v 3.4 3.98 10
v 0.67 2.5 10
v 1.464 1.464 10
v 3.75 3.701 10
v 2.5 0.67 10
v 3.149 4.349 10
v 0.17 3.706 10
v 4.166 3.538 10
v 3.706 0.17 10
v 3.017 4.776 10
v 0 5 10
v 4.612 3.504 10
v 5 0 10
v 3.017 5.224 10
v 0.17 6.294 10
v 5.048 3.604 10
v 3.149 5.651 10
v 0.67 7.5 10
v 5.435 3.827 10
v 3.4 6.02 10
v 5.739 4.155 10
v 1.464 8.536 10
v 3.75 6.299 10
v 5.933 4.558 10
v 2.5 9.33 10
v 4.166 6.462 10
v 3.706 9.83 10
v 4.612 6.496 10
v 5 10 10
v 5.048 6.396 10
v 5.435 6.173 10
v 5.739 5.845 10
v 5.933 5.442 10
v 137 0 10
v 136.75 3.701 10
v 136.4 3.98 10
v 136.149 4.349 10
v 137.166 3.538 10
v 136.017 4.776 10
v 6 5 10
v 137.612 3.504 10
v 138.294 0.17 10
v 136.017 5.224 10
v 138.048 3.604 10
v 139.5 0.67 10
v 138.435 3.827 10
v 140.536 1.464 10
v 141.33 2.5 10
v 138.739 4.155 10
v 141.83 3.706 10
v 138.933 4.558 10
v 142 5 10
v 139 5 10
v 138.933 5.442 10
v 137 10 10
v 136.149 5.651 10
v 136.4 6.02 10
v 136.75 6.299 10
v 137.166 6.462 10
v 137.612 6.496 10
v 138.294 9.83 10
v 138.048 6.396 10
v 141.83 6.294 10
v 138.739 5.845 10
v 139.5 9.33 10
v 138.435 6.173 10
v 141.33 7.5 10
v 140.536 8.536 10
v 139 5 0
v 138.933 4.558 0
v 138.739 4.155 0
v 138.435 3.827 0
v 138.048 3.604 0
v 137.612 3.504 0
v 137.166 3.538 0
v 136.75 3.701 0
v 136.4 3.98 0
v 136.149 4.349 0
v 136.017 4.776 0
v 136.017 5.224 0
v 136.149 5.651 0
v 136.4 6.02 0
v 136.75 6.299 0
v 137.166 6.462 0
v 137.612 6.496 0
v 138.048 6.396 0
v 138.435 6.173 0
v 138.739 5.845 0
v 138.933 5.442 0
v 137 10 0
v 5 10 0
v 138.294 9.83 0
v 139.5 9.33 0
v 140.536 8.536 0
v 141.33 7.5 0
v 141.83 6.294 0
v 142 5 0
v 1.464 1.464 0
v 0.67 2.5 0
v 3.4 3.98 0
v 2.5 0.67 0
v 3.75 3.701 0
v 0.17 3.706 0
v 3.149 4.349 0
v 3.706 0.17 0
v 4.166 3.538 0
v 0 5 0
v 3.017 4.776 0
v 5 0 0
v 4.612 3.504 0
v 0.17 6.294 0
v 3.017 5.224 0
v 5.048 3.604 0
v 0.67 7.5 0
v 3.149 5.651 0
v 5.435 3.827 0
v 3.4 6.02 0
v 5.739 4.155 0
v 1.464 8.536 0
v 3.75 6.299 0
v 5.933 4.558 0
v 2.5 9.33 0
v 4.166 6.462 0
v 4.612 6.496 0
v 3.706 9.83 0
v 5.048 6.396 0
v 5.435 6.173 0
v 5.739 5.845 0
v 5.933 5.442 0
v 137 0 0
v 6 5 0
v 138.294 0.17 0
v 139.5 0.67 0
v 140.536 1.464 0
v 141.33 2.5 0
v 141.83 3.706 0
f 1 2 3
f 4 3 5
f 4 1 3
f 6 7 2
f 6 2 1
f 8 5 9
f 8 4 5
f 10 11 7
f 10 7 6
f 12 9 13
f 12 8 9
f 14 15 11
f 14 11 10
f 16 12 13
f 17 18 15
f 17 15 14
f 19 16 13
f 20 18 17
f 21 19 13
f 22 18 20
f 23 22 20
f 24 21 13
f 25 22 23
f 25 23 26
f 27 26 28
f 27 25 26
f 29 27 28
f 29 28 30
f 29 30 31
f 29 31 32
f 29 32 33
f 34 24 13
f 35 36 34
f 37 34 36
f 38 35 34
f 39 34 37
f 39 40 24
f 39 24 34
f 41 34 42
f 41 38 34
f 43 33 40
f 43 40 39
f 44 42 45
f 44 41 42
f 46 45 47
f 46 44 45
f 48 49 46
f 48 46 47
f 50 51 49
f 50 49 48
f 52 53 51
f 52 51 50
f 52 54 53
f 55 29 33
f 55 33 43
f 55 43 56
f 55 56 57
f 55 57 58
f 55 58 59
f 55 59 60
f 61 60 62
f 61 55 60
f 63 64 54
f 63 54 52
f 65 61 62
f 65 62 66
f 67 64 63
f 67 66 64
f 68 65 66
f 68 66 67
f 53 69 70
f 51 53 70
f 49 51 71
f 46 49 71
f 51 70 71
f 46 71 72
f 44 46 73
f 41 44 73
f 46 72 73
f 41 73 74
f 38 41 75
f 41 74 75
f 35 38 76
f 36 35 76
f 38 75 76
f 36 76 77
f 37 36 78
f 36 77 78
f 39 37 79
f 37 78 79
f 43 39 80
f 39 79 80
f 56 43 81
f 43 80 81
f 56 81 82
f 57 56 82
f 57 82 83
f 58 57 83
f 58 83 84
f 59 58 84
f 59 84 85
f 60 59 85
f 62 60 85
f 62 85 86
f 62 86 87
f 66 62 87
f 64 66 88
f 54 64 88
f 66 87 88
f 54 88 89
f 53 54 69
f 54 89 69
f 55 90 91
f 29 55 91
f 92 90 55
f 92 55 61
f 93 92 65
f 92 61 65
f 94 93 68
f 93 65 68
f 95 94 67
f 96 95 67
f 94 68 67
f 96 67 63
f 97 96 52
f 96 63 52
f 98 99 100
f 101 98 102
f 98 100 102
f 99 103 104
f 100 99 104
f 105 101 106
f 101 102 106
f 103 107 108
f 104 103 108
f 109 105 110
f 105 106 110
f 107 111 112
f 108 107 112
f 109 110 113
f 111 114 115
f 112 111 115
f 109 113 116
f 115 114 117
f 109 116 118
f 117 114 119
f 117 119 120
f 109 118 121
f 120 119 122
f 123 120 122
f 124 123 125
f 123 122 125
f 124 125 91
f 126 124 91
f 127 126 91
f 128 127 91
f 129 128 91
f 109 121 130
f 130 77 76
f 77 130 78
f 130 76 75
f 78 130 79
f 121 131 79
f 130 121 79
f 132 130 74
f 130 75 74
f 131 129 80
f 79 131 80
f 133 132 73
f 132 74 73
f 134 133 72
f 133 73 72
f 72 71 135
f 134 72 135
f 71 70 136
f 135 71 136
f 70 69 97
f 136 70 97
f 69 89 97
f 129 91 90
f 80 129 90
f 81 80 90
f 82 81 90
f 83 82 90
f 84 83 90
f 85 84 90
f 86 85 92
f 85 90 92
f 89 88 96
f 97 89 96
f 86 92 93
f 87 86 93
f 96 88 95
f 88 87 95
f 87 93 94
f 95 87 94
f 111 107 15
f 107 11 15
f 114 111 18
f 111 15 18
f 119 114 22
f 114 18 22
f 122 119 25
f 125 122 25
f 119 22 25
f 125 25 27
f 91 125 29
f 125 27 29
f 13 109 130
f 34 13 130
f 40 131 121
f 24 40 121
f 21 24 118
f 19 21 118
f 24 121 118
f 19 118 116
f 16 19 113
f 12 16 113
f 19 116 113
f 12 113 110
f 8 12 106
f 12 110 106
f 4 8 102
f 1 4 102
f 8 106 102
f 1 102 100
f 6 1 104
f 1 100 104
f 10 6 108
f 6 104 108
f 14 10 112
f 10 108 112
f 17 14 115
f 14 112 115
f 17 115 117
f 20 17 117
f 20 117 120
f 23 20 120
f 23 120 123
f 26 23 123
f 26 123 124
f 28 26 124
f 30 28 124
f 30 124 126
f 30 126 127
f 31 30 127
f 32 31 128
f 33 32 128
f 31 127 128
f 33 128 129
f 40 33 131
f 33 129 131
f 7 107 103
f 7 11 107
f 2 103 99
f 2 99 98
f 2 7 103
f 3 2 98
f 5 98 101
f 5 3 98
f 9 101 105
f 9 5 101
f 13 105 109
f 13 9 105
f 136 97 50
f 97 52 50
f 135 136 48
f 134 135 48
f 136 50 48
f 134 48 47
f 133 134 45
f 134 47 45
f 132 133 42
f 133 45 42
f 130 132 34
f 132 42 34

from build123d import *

# Parameters (mm, degrees)
BOSS_EXTRUDE1_DEPTH = 10
FILLET2_R           = 5
FILLET3_R           = 5
FILLET4_R           = 5
FILLET5_R           = 5


with BuildPart() as part:
    # Sketch1 → Boss-Extrude1 (new body)
    with BuildSketch(Plane.XY):
        with BuildLine():
            Line((0, 10), (0, 5))
            Line((0, 5), (3, 5))
            ThreePointArc((3, 5), (4.5, 6.5), (6, 5))
            Line((6, 5), (136, 5))
            ThreePointArc((136, 5), (137.5, 6.5), (139, 5))
            Line((139, 5), (142, 5))
            Line((142, 5), (142, 10))
            Line((142, 10), (0, 10))
        make_face()
        with BuildLine():
            Line((3, 5), (0, 5))
            Line((0, 5), (0, 0))
            Line((0, 0), (142, 0))
            Line((142, 0), (142, 5))
            Line((142, 5), (139, 5))
            ThreePointArc((139, 5), (137.5, 3.5), (136, 5))
            Line((136, 5), (6, 5))
            ThreePointArc((6, 5), (4.5, 3.5), (3, 5))
        make_face()
    extrude(amount=BOSS_EXTRUDE1_DEPTH)

    # Fillet2
    fillet2_edges = [part.edges().sort_by_distance(p)[0] for p in [
        (0, 10, 5),
    ]]
    fillet(fillet2_edges, radius=FILLET2_R)

    # Fillet3
    fillet3_edges = [part.edges().sort_by_distance(p)[0] for p in [
        (0, 0, 5),
    ]]
    fillet(fillet3_edges, radius=FILLET3_R - 0.0001)  # a hair under: the kernel refuses the full size

    # Fillet4
    fillet4_edges = [part.edges().sort_by_distance(p)[0] for p in [
        (142, 10, 5),
    ]]
    fillet(fillet4_edges, radius=FILLET4_R)

    # Fillet5
    fillet5_edges = [part.edges().sort_by_distance(p)[0] for p in [
        (142, 0, 5),
    ]]
    fillet(fillet5_edges, radius=FILLET5_R - 0.0001)  # a hair under: the kernel refuses the full size


solid = part.part
